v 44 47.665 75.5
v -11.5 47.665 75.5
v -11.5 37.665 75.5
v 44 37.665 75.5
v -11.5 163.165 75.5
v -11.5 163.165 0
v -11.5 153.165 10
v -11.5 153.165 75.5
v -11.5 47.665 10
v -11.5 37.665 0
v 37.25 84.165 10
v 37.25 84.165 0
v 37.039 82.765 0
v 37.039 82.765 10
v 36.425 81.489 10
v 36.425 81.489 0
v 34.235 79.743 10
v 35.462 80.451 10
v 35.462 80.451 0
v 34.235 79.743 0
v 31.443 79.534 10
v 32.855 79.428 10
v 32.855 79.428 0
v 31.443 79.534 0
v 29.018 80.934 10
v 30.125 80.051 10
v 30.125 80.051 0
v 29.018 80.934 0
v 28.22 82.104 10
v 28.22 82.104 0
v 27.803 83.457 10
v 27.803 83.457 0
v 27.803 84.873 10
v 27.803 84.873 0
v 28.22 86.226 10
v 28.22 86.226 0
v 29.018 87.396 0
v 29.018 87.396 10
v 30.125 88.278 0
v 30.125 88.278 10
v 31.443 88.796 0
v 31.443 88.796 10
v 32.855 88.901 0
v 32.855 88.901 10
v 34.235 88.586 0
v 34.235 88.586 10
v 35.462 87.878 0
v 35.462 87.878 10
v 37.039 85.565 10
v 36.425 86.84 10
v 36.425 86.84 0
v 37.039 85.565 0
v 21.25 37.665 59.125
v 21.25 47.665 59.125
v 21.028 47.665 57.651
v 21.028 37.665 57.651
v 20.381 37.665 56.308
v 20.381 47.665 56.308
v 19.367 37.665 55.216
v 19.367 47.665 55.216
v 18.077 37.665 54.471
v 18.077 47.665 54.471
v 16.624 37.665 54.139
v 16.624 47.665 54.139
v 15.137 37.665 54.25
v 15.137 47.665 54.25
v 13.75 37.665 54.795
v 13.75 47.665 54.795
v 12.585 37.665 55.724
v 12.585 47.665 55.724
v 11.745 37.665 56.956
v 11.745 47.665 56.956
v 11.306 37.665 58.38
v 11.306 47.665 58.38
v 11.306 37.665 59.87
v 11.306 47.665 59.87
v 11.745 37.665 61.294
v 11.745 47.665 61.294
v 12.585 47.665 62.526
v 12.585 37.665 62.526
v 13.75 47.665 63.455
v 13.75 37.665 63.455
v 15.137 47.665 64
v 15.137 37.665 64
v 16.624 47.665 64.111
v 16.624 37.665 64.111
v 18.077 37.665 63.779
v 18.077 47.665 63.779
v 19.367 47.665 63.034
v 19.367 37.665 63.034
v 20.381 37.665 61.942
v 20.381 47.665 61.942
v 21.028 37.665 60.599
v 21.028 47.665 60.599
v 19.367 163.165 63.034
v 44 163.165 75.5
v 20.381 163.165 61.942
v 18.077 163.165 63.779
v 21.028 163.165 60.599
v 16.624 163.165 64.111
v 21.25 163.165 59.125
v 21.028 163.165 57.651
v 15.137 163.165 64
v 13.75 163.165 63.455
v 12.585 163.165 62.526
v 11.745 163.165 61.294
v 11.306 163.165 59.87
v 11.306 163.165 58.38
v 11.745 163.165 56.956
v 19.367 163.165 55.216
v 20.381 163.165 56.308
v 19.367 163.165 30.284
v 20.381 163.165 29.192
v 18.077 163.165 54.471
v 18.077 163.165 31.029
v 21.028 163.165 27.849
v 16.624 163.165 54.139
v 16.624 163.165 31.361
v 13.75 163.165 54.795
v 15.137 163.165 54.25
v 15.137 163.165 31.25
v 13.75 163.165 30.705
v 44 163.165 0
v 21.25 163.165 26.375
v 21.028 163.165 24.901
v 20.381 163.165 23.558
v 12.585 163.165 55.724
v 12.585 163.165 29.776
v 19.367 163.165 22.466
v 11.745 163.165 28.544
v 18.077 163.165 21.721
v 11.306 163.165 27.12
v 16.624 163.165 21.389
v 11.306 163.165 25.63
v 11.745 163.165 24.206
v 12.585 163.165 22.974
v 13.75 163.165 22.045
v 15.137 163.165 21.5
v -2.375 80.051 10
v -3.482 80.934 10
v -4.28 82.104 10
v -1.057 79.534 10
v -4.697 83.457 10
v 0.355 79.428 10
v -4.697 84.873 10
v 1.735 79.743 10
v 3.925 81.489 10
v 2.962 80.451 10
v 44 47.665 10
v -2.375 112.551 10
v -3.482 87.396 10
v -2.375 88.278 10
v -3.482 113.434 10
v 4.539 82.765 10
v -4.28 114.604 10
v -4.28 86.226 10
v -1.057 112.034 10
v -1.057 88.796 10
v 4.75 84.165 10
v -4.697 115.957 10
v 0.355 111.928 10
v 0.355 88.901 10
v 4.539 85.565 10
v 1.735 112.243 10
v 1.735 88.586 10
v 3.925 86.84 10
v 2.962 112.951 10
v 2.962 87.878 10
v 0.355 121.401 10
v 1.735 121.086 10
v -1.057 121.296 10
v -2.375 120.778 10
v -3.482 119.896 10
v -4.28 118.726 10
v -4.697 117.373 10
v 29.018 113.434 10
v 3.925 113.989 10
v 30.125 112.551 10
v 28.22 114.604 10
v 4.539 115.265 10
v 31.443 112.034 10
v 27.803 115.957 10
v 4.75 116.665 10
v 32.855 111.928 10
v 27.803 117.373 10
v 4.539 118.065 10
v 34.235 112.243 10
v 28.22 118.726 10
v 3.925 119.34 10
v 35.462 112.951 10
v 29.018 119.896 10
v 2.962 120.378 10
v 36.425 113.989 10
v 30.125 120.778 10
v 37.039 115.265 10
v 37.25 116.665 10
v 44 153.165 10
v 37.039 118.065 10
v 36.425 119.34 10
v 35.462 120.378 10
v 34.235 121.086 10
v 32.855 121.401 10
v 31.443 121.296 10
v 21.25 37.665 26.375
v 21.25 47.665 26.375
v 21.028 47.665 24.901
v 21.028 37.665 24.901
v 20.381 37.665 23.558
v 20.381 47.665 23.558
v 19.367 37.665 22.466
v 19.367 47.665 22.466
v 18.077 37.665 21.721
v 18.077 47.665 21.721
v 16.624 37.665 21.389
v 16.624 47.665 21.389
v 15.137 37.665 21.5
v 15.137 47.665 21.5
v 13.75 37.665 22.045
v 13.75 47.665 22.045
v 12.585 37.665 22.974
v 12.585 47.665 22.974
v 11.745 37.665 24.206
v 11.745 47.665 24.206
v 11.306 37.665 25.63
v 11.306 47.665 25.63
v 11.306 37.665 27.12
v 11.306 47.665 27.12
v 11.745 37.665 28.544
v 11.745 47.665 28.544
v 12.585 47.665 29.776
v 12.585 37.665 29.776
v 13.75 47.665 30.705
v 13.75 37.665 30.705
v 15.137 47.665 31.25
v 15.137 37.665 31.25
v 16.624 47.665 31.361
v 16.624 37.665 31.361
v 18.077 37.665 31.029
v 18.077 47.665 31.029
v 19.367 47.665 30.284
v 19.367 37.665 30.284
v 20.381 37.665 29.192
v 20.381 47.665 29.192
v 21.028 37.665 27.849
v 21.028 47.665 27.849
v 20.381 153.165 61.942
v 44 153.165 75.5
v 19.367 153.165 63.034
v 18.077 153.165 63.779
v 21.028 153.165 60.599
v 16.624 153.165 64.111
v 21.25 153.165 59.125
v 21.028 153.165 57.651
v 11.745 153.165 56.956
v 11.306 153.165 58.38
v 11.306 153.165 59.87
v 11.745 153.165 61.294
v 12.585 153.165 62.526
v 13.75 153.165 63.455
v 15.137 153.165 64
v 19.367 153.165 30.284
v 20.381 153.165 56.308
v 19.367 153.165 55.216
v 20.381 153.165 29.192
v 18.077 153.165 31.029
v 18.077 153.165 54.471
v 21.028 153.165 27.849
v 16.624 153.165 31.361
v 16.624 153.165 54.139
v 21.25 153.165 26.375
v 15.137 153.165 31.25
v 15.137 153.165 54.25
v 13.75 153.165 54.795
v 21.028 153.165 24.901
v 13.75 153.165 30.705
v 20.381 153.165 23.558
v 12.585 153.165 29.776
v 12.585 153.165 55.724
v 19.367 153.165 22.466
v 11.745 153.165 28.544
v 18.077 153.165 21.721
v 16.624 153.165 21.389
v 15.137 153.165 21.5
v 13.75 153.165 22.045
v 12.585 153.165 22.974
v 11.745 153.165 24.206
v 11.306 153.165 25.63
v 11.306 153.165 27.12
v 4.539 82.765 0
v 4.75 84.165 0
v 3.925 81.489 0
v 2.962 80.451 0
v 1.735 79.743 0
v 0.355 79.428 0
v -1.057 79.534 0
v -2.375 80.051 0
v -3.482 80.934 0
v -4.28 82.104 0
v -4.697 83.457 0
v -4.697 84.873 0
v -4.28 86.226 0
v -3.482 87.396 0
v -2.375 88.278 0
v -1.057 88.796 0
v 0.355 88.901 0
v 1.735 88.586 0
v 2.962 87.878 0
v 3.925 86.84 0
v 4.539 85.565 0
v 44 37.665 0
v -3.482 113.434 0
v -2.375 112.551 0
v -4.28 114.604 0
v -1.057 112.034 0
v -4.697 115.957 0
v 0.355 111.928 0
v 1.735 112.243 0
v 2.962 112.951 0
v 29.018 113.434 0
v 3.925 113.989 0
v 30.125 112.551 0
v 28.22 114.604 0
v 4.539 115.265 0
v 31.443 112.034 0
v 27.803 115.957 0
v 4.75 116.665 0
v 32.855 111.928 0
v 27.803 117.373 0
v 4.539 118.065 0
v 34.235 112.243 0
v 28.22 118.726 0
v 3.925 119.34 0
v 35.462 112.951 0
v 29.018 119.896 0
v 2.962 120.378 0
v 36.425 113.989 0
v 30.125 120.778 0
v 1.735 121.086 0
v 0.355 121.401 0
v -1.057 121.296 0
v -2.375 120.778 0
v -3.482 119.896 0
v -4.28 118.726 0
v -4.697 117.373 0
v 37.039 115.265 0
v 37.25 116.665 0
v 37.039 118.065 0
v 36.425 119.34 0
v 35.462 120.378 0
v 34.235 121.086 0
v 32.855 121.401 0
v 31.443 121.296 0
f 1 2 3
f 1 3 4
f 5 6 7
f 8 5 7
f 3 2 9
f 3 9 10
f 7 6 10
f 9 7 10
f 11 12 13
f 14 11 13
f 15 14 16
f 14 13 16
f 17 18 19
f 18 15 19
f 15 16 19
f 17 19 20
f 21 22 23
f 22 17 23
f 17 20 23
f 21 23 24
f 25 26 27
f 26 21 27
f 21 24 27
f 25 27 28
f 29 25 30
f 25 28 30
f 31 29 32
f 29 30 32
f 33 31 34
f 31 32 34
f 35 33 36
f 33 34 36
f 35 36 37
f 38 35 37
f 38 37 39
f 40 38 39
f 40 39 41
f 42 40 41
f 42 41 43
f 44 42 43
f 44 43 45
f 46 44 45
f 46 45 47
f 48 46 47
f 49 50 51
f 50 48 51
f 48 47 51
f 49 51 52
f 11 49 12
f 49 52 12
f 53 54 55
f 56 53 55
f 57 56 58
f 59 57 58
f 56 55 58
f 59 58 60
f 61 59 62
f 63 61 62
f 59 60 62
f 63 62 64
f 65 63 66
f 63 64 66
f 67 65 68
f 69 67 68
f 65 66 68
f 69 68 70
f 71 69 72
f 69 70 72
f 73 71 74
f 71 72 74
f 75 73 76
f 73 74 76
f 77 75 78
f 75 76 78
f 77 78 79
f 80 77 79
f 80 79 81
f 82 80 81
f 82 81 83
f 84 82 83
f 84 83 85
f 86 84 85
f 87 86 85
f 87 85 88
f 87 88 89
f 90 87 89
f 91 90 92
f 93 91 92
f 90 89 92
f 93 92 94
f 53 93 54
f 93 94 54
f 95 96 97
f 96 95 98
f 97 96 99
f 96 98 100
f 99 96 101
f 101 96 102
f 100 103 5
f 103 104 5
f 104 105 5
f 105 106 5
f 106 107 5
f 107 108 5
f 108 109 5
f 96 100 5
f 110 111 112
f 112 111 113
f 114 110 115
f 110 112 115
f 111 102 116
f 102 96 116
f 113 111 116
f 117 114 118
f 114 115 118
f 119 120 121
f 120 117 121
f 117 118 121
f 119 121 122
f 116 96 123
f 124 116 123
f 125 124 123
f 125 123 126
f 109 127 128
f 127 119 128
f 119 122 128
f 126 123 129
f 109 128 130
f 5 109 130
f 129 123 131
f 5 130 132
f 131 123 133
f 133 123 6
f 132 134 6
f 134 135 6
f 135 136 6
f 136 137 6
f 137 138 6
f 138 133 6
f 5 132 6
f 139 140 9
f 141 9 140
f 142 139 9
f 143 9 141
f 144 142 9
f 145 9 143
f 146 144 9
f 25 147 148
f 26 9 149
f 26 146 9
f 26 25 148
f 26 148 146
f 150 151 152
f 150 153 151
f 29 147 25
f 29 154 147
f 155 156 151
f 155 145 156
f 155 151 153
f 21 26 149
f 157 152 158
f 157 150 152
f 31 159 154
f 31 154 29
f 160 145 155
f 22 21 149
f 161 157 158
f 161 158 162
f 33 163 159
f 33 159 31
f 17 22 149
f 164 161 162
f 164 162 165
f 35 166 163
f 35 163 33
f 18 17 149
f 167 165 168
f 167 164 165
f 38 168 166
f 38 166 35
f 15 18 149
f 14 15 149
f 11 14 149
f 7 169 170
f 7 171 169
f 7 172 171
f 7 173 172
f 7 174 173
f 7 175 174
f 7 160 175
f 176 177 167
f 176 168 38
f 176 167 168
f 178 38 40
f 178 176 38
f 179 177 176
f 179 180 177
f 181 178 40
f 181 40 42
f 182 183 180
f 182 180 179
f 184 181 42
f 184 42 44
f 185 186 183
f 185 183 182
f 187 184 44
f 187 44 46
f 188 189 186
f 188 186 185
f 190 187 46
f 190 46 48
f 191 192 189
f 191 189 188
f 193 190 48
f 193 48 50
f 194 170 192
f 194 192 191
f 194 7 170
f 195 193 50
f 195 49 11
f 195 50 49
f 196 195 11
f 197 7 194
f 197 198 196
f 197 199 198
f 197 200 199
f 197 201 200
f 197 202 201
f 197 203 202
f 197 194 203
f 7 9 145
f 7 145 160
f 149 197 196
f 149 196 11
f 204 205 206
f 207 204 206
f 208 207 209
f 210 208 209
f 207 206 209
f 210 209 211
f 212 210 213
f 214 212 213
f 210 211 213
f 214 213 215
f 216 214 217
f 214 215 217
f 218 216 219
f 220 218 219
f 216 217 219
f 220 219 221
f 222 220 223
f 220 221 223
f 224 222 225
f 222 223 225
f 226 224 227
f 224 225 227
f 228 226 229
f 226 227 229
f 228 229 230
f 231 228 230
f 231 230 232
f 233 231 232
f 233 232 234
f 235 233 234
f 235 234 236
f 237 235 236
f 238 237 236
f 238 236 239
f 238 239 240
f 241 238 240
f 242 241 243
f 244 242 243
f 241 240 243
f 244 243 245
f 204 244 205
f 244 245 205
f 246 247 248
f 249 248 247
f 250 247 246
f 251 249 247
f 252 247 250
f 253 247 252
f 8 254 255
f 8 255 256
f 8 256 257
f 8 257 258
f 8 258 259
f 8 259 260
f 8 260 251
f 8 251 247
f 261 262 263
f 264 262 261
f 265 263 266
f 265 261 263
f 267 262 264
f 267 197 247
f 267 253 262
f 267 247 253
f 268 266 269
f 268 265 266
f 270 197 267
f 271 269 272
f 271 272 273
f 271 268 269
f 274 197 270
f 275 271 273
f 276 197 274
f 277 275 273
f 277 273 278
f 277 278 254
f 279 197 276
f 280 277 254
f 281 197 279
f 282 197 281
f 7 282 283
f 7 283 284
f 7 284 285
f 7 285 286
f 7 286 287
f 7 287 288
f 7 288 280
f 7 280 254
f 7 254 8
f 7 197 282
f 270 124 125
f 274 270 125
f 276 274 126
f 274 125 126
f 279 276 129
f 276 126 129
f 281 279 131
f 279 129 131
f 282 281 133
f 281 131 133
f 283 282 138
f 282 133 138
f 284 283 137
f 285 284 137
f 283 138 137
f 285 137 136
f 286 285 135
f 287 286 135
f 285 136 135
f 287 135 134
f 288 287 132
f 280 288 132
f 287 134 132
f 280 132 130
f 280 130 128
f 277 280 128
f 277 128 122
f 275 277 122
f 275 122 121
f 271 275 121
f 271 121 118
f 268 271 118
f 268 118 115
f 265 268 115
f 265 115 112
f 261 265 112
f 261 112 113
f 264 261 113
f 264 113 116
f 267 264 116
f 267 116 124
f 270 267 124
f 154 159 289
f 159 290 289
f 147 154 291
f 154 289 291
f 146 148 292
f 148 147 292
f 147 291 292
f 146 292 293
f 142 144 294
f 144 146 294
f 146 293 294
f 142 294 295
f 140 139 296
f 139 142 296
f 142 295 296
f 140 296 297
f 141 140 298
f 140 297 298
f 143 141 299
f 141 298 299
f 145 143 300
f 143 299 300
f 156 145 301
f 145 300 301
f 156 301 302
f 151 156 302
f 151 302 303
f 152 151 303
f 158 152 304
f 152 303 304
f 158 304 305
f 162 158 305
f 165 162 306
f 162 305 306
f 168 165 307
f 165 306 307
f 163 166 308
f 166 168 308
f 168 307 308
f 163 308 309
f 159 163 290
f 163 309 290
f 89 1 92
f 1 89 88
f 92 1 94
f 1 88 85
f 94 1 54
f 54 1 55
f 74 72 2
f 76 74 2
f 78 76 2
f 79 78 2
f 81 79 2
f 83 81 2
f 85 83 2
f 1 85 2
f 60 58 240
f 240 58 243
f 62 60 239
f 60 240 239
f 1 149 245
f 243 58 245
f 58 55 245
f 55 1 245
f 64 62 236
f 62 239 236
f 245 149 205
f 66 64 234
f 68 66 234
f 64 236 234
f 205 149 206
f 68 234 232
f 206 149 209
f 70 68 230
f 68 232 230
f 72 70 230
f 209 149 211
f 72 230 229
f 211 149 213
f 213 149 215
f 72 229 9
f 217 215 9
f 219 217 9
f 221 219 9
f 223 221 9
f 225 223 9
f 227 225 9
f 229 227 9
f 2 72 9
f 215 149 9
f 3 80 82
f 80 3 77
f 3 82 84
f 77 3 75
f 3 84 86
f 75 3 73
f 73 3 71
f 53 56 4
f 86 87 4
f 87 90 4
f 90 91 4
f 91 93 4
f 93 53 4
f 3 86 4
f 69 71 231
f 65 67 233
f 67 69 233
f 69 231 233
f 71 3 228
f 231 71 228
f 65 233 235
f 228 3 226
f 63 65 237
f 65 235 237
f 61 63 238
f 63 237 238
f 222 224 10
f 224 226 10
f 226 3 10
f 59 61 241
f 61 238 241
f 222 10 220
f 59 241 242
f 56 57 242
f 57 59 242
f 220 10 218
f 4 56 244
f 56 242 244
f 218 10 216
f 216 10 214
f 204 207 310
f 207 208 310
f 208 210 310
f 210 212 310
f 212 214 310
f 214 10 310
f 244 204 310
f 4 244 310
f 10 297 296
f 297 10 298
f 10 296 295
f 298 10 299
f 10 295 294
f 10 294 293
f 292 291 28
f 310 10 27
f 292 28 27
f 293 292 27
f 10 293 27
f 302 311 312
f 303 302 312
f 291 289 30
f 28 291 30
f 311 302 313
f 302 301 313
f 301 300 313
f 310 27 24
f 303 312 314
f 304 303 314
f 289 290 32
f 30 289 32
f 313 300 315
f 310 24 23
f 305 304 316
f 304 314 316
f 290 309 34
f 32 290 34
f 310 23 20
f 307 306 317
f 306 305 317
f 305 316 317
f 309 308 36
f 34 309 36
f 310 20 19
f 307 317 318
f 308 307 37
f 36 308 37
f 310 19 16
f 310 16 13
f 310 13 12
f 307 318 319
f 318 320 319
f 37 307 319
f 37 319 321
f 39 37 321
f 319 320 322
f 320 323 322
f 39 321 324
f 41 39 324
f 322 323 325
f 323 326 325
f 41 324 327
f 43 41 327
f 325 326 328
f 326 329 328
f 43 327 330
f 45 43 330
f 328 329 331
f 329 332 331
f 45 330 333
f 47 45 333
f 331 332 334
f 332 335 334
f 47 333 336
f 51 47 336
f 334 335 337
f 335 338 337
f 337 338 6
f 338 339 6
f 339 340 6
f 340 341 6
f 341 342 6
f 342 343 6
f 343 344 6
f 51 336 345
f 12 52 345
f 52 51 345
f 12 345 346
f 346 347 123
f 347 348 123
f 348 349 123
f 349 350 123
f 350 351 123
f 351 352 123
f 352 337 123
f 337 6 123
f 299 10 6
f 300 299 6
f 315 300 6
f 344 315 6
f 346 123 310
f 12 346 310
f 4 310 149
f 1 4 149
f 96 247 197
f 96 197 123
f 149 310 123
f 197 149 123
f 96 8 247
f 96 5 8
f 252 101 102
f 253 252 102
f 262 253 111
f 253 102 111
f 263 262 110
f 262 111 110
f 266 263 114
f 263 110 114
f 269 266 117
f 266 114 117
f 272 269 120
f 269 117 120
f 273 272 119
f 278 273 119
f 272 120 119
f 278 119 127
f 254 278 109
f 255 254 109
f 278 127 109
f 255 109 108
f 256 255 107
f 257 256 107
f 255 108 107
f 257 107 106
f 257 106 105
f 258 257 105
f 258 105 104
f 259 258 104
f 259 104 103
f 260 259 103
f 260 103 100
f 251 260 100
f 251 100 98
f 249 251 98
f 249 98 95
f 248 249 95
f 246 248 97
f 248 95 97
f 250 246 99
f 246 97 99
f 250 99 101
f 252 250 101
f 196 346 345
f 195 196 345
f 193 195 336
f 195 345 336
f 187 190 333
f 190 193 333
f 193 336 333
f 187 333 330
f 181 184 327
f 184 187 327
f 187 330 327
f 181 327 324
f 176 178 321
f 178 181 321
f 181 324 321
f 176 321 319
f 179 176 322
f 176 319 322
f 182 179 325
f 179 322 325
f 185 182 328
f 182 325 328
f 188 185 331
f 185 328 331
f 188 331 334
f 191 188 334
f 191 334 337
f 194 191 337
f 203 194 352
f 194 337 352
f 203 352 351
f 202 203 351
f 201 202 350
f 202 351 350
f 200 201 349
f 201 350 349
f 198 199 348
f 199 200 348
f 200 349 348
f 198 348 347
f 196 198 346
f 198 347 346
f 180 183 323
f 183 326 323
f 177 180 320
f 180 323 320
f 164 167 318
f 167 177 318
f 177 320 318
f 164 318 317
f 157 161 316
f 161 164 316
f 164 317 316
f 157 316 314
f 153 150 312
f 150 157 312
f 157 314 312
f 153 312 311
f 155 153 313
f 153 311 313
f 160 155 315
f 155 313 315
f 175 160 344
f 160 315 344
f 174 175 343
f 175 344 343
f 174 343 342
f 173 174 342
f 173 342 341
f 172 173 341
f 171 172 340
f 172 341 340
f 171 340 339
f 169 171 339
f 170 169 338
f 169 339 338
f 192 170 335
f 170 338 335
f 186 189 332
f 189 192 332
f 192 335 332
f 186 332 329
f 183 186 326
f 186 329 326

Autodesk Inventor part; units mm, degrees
ref_plane "YZ Plane" through (0, 0, 0) normal (1, 0, 0) x (0, 1, 0)
ref_plane "XZ Plane" through (0, 0, 0) normal (0, 1, 0) x (-1, 0, 0)
ref_plane "XY Plane" through (0, 0, 0) normal (0, 0, 1) x (1, 0, 0)
sketch "Sketch1" plane through (0, 0, 0) normal (0, 0, 1) x (1, 0, 0)
  line L0 (-6, 110.6647) -> (-6, 110.2647)
  arc A0 (-6, 110.2647) -> (-5.6, 109.8647) centre (-5.6, 110.2647) ccw
  line L1 (-5.6, 109.8647) -> (-4.9, 109.8647)
  arc A1 (-4.9, 109.8647) -> (-4.7, 110.0647) centre (-4.9, 110.0647) ccw
  line L2 (-4.7, 110.0647) -> (-4.7, 110.3147)
  arc A2 (-4.5, 110.5147) -> (-4.7, 110.3147) centre (-4.5, 110.3147) ccw
  line L3 (-4.5, 110.5147) -> (-1.8, 110.5147)
  arc A3 (-1.4, 110.1147) -> (-1.8, 110.5147) centre (-1.8, 110.1147) ccw
  line L4 (-1.4, 110.1147) -> (-1.4, 104.4147)
  line L5 (-1.8, 104.0147) -> (-4.5, 104.0147)
  arc A4 (-1.8, 104.0147) -> (-1.4, 104.4147) centre (-1.8, 104.4147) ccw
  arc A5 (-4.7, 104.2147) -> (-4.5, 104.0147) centre (-4.5, 104.2147) ccw
  line L6 (-4.7, 104.2147) -> (-4.7, 104.4647)
  arc A6 (-4.7, 104.4647) -> (-4.9, 104.6647) centre (-4.9, 104.4647) ccw
  line L7 (-4.9, 104.6647) -> (-5.6, 104.6647)
  arc A7 (-5.6, 104.6647) -> (-6, 104.2647) centre (-5.6, 104.2647) ccw
  line L8 (-6, 104.2647) -> (-6, 103.6647)
  line L9 (-6.5, 116.6647) -> (-6.5, 110.6647)
  line L10 (-6.5, 110.6647) -> (-2.5, 110.6647)
  line L11 (-1.05, 103.6647) -> (-6.5, 103.6647)
  line L12 (-6.5, 103.6647) -> (-6.5, 97.1647)
  line L13 (-6.5, 97.1647) -> (-1.05, 97.1647)
  line L14 (-6, 97.1647) -> (-6, 96.5647)
  arc A8 (-6, 96.5647) -> (-5.6, 96.1647) centre (-5.6, 96.5647) ccw
  line L15 (-5.6, 96.1647) -> (-4.9, 96.1647)
  arc A9 (-4.9, 96.1647) -> (-4.7, 96.3647) centre (-4.9, 96.3647) ccw
  arc A10 (-4.5, 96.8147) -> (-4.7, 96.6147) centre (-4.5, 96.6147) ccw
  line L16 (-4.7, 96.3647) -> (-4.7, 96.6147)
  line L17 (-4.5, 96.8147) -> (-1.8, 96.8147)
  arc A11 (-1.4, 96.4147) -> (-1.8, 96.8147) centre (-1.8, 96.4147) ccw
  line L18 (-1.4, 96.4147) -> (-1.4, 90.7147)
  arc A12 (-1.8, 90.3147) -> (-1.4, 90.7147) centre (-1.8, 90.7147) ccw
  line L19 (-1.8, 90.3147) -> (-4.5, 90.3147)
  arc A13 (-4.7, 90.5147) -> (-4.5, 90.3147) centre (-4.5, 90.5147) ccw
  line L20 (-4.7, 90.5147) -> (-4.7, 90.7647)
  arc A14 (-4.7, 90.7647) -> (-4.9, 90.9647) centre (-4.9, 90.7647) ccw
  line L21 (-4.9, 90.9647) -> (-5.6, 90.9647)
  arc A15 (-5.6, 90.9647) -> (-6, 90.5647) centre (-5.6, 90.5647) ccw
  line L22 (-6, 90.5647) -> (-6, 90.1647)
  line L23 (-2.5, 90.1647) -> (-6.5, 90.1647)
  line L24 (-6.5, 90.1647) -> (-6.5, 84.1647)
  line L25 (32.5, 123.1647) -> (0, 123.1647)
  circle A16 centre (0, 116.6647) radius 4.75
  circle A17 centre (32.5, 116.6647) radius 4.75
  circle A18 centre (0, 84.1647) radius 4.75
  circle A19 centre (32.5, 84.1647) radius 4.75
  line L26 (39, 97.1647) -> (39, 103.6647)
  line L27 (39, 110.6647) -> (39, 116.6647)
  line L28 (39, 84.1647) -> (39, 90.1647)
  line L29 (26.5, 77.6647) -> (32.5, 77.6647)
  line L30 (0, 77.6647) -> (6, 77.6647)
  line L31 (13, 77.6647) -> (19.5, 77.6647)
  circle A20 centre (16.25, 100.4147) radius 15
  circle A21 centre (16.2588, 5.0016) radius 2.5
  circle A22 centre (16.25, -50.5) radius 2.5
  circle A23 centre (16.25, 100.4147) radius 5
  circle A24 centre (16.25, 100.4147) radius 8.45
  line L32 (24.75, 95.5072) -> (24.75, 105.3221)
  line L33 (44, 10) -> (-11.5, 10)
  line L34 (-11.5, 10) -> (-11.5, -55.5)
  line L35 (-11.5, -55.5) -> (44, -55.5)
  line L36 (44, -55.5) -> (44, 10)
  line L37 (-11.5, 30) -> (44, 30)
  line L38 (-11.5, -75.5) -> (-11.5, 30)
  line L39 (44, 30) -> (44, -75.5)
  line L40 (44, -75.5) -> (-11.5, -75.5)
  circle A25 centre (16.25, -65.5) radius 5
  circle A26 centre (16.25, 20) radius 5
  line L41 (-11.5, 37.6647) -> (44, 37.6647)
  line L42 (44, 37.6647) -> (44, 163.1647)
  line L43 (44, 163.1647) -> (-11.5, 163.1647)
  line L44 (-11.5, 163.1647) -> (-11.5, 37.6647)
  line L45 (-11.5, 163.1647) -> (44, 37.6647)
  line L46 (16.25, 100.4147) -> (112.1111, 100.4147)
  dimension "d2" = 125.5
extrude "Extrusion1" add sketch "Sketch1" along normal blind 10 contours L46 A24 L45 A20 | L46 L42 L45 A20 | A20 L45 A24 L46 | A20 L45 L43 L42 L46 | L45 A24 A20 | A20 L45 L41 L44 | L45 A23 A24 | A24 L46 A23 L45 | L45 A23 L46 A24 | L45 A23 | A23 L46 L45 | L45 L46 A23
sketch "Sketch2" plane through (0, 0, 10) normal (0, 0, 1) x (1, 0, 0)
  line L0 (44, 163.1647) -> (-11.5, 163.1647) projected
  line L1 (44, 37.6647) -> (44, 163.1647) projected
  line L2 (-11.5, 163.1647) -> (44, 163.1647)
  line L3 (44, 163.1647) -> (44, 153.1647)
  line L4 (44, 153.1647) -> (-11.5, 153.1647)
  line L5 (-11.5, 153.1647) -> (-11.5, 163.1647)
  line L6 (-11.5, 37.6647) -> (44, 37.6647)
  line L7 (44, 37.6647) -> (44, 47.6647)
  line L8 (44, 47.6647) -> (-11.5, 47.6647)
  line L9 (-11.5, 47.6647) -> (-11.5, 37.6647)
  point P0 (0, 0)
  dimension "d5" = 10
  dimension "d6" = 10
extrude "Extrusion2" add sketch "Sketch2" along normal blind 65.5
sketch "Sketch3" plane through (-11.5, 163.1647, 0) normal (0, 1, 0) x (1, 0, 0)
  line L0 (0, -10) -> (55.5, -10) projected
  line L1 (0, -10) -> (0, -75.5) projected
  line L2 (55.5, -10) -> (0, -10)
  line L3 (0, -10) -> (0, -75.5)
  line L4 (0, -75.5) -> (55.5, -75.5)
  line L5 (55.5, -75.5) -> (55.5, -10)
  line L6 (55.5, -10) -> (55.5, -75.5) projected
  line L7 (55.5, -42.75) -> (0, -42.75)
  line L8 (55.5, -10) -> (0, -42.75)
  line L9 (27.75, -26.375) -> (27.75, -42.75)
  line L10 (55.5, -42.75) -> (0, -75.5)
  line L11 (27.75, -59.125) -> (27.75, -42.75)
  circle A0 centre (27.75, -26.375) radius 5
  circle A1 centre (27.75, -59.125) radius 5
  point P0 (11.5, 0)
  dimension "d9" = 10
  dimension "d10" = 10
extrude "Extrusion3" cut sketch "Sketch3" against normal through all contours A0 L9 L8 | L8 A0 | L8 L9 A0 | A1 L10 | L10 L11 A1 | A1 L11 L10
properties part number "AcopleActuadorCarro"
